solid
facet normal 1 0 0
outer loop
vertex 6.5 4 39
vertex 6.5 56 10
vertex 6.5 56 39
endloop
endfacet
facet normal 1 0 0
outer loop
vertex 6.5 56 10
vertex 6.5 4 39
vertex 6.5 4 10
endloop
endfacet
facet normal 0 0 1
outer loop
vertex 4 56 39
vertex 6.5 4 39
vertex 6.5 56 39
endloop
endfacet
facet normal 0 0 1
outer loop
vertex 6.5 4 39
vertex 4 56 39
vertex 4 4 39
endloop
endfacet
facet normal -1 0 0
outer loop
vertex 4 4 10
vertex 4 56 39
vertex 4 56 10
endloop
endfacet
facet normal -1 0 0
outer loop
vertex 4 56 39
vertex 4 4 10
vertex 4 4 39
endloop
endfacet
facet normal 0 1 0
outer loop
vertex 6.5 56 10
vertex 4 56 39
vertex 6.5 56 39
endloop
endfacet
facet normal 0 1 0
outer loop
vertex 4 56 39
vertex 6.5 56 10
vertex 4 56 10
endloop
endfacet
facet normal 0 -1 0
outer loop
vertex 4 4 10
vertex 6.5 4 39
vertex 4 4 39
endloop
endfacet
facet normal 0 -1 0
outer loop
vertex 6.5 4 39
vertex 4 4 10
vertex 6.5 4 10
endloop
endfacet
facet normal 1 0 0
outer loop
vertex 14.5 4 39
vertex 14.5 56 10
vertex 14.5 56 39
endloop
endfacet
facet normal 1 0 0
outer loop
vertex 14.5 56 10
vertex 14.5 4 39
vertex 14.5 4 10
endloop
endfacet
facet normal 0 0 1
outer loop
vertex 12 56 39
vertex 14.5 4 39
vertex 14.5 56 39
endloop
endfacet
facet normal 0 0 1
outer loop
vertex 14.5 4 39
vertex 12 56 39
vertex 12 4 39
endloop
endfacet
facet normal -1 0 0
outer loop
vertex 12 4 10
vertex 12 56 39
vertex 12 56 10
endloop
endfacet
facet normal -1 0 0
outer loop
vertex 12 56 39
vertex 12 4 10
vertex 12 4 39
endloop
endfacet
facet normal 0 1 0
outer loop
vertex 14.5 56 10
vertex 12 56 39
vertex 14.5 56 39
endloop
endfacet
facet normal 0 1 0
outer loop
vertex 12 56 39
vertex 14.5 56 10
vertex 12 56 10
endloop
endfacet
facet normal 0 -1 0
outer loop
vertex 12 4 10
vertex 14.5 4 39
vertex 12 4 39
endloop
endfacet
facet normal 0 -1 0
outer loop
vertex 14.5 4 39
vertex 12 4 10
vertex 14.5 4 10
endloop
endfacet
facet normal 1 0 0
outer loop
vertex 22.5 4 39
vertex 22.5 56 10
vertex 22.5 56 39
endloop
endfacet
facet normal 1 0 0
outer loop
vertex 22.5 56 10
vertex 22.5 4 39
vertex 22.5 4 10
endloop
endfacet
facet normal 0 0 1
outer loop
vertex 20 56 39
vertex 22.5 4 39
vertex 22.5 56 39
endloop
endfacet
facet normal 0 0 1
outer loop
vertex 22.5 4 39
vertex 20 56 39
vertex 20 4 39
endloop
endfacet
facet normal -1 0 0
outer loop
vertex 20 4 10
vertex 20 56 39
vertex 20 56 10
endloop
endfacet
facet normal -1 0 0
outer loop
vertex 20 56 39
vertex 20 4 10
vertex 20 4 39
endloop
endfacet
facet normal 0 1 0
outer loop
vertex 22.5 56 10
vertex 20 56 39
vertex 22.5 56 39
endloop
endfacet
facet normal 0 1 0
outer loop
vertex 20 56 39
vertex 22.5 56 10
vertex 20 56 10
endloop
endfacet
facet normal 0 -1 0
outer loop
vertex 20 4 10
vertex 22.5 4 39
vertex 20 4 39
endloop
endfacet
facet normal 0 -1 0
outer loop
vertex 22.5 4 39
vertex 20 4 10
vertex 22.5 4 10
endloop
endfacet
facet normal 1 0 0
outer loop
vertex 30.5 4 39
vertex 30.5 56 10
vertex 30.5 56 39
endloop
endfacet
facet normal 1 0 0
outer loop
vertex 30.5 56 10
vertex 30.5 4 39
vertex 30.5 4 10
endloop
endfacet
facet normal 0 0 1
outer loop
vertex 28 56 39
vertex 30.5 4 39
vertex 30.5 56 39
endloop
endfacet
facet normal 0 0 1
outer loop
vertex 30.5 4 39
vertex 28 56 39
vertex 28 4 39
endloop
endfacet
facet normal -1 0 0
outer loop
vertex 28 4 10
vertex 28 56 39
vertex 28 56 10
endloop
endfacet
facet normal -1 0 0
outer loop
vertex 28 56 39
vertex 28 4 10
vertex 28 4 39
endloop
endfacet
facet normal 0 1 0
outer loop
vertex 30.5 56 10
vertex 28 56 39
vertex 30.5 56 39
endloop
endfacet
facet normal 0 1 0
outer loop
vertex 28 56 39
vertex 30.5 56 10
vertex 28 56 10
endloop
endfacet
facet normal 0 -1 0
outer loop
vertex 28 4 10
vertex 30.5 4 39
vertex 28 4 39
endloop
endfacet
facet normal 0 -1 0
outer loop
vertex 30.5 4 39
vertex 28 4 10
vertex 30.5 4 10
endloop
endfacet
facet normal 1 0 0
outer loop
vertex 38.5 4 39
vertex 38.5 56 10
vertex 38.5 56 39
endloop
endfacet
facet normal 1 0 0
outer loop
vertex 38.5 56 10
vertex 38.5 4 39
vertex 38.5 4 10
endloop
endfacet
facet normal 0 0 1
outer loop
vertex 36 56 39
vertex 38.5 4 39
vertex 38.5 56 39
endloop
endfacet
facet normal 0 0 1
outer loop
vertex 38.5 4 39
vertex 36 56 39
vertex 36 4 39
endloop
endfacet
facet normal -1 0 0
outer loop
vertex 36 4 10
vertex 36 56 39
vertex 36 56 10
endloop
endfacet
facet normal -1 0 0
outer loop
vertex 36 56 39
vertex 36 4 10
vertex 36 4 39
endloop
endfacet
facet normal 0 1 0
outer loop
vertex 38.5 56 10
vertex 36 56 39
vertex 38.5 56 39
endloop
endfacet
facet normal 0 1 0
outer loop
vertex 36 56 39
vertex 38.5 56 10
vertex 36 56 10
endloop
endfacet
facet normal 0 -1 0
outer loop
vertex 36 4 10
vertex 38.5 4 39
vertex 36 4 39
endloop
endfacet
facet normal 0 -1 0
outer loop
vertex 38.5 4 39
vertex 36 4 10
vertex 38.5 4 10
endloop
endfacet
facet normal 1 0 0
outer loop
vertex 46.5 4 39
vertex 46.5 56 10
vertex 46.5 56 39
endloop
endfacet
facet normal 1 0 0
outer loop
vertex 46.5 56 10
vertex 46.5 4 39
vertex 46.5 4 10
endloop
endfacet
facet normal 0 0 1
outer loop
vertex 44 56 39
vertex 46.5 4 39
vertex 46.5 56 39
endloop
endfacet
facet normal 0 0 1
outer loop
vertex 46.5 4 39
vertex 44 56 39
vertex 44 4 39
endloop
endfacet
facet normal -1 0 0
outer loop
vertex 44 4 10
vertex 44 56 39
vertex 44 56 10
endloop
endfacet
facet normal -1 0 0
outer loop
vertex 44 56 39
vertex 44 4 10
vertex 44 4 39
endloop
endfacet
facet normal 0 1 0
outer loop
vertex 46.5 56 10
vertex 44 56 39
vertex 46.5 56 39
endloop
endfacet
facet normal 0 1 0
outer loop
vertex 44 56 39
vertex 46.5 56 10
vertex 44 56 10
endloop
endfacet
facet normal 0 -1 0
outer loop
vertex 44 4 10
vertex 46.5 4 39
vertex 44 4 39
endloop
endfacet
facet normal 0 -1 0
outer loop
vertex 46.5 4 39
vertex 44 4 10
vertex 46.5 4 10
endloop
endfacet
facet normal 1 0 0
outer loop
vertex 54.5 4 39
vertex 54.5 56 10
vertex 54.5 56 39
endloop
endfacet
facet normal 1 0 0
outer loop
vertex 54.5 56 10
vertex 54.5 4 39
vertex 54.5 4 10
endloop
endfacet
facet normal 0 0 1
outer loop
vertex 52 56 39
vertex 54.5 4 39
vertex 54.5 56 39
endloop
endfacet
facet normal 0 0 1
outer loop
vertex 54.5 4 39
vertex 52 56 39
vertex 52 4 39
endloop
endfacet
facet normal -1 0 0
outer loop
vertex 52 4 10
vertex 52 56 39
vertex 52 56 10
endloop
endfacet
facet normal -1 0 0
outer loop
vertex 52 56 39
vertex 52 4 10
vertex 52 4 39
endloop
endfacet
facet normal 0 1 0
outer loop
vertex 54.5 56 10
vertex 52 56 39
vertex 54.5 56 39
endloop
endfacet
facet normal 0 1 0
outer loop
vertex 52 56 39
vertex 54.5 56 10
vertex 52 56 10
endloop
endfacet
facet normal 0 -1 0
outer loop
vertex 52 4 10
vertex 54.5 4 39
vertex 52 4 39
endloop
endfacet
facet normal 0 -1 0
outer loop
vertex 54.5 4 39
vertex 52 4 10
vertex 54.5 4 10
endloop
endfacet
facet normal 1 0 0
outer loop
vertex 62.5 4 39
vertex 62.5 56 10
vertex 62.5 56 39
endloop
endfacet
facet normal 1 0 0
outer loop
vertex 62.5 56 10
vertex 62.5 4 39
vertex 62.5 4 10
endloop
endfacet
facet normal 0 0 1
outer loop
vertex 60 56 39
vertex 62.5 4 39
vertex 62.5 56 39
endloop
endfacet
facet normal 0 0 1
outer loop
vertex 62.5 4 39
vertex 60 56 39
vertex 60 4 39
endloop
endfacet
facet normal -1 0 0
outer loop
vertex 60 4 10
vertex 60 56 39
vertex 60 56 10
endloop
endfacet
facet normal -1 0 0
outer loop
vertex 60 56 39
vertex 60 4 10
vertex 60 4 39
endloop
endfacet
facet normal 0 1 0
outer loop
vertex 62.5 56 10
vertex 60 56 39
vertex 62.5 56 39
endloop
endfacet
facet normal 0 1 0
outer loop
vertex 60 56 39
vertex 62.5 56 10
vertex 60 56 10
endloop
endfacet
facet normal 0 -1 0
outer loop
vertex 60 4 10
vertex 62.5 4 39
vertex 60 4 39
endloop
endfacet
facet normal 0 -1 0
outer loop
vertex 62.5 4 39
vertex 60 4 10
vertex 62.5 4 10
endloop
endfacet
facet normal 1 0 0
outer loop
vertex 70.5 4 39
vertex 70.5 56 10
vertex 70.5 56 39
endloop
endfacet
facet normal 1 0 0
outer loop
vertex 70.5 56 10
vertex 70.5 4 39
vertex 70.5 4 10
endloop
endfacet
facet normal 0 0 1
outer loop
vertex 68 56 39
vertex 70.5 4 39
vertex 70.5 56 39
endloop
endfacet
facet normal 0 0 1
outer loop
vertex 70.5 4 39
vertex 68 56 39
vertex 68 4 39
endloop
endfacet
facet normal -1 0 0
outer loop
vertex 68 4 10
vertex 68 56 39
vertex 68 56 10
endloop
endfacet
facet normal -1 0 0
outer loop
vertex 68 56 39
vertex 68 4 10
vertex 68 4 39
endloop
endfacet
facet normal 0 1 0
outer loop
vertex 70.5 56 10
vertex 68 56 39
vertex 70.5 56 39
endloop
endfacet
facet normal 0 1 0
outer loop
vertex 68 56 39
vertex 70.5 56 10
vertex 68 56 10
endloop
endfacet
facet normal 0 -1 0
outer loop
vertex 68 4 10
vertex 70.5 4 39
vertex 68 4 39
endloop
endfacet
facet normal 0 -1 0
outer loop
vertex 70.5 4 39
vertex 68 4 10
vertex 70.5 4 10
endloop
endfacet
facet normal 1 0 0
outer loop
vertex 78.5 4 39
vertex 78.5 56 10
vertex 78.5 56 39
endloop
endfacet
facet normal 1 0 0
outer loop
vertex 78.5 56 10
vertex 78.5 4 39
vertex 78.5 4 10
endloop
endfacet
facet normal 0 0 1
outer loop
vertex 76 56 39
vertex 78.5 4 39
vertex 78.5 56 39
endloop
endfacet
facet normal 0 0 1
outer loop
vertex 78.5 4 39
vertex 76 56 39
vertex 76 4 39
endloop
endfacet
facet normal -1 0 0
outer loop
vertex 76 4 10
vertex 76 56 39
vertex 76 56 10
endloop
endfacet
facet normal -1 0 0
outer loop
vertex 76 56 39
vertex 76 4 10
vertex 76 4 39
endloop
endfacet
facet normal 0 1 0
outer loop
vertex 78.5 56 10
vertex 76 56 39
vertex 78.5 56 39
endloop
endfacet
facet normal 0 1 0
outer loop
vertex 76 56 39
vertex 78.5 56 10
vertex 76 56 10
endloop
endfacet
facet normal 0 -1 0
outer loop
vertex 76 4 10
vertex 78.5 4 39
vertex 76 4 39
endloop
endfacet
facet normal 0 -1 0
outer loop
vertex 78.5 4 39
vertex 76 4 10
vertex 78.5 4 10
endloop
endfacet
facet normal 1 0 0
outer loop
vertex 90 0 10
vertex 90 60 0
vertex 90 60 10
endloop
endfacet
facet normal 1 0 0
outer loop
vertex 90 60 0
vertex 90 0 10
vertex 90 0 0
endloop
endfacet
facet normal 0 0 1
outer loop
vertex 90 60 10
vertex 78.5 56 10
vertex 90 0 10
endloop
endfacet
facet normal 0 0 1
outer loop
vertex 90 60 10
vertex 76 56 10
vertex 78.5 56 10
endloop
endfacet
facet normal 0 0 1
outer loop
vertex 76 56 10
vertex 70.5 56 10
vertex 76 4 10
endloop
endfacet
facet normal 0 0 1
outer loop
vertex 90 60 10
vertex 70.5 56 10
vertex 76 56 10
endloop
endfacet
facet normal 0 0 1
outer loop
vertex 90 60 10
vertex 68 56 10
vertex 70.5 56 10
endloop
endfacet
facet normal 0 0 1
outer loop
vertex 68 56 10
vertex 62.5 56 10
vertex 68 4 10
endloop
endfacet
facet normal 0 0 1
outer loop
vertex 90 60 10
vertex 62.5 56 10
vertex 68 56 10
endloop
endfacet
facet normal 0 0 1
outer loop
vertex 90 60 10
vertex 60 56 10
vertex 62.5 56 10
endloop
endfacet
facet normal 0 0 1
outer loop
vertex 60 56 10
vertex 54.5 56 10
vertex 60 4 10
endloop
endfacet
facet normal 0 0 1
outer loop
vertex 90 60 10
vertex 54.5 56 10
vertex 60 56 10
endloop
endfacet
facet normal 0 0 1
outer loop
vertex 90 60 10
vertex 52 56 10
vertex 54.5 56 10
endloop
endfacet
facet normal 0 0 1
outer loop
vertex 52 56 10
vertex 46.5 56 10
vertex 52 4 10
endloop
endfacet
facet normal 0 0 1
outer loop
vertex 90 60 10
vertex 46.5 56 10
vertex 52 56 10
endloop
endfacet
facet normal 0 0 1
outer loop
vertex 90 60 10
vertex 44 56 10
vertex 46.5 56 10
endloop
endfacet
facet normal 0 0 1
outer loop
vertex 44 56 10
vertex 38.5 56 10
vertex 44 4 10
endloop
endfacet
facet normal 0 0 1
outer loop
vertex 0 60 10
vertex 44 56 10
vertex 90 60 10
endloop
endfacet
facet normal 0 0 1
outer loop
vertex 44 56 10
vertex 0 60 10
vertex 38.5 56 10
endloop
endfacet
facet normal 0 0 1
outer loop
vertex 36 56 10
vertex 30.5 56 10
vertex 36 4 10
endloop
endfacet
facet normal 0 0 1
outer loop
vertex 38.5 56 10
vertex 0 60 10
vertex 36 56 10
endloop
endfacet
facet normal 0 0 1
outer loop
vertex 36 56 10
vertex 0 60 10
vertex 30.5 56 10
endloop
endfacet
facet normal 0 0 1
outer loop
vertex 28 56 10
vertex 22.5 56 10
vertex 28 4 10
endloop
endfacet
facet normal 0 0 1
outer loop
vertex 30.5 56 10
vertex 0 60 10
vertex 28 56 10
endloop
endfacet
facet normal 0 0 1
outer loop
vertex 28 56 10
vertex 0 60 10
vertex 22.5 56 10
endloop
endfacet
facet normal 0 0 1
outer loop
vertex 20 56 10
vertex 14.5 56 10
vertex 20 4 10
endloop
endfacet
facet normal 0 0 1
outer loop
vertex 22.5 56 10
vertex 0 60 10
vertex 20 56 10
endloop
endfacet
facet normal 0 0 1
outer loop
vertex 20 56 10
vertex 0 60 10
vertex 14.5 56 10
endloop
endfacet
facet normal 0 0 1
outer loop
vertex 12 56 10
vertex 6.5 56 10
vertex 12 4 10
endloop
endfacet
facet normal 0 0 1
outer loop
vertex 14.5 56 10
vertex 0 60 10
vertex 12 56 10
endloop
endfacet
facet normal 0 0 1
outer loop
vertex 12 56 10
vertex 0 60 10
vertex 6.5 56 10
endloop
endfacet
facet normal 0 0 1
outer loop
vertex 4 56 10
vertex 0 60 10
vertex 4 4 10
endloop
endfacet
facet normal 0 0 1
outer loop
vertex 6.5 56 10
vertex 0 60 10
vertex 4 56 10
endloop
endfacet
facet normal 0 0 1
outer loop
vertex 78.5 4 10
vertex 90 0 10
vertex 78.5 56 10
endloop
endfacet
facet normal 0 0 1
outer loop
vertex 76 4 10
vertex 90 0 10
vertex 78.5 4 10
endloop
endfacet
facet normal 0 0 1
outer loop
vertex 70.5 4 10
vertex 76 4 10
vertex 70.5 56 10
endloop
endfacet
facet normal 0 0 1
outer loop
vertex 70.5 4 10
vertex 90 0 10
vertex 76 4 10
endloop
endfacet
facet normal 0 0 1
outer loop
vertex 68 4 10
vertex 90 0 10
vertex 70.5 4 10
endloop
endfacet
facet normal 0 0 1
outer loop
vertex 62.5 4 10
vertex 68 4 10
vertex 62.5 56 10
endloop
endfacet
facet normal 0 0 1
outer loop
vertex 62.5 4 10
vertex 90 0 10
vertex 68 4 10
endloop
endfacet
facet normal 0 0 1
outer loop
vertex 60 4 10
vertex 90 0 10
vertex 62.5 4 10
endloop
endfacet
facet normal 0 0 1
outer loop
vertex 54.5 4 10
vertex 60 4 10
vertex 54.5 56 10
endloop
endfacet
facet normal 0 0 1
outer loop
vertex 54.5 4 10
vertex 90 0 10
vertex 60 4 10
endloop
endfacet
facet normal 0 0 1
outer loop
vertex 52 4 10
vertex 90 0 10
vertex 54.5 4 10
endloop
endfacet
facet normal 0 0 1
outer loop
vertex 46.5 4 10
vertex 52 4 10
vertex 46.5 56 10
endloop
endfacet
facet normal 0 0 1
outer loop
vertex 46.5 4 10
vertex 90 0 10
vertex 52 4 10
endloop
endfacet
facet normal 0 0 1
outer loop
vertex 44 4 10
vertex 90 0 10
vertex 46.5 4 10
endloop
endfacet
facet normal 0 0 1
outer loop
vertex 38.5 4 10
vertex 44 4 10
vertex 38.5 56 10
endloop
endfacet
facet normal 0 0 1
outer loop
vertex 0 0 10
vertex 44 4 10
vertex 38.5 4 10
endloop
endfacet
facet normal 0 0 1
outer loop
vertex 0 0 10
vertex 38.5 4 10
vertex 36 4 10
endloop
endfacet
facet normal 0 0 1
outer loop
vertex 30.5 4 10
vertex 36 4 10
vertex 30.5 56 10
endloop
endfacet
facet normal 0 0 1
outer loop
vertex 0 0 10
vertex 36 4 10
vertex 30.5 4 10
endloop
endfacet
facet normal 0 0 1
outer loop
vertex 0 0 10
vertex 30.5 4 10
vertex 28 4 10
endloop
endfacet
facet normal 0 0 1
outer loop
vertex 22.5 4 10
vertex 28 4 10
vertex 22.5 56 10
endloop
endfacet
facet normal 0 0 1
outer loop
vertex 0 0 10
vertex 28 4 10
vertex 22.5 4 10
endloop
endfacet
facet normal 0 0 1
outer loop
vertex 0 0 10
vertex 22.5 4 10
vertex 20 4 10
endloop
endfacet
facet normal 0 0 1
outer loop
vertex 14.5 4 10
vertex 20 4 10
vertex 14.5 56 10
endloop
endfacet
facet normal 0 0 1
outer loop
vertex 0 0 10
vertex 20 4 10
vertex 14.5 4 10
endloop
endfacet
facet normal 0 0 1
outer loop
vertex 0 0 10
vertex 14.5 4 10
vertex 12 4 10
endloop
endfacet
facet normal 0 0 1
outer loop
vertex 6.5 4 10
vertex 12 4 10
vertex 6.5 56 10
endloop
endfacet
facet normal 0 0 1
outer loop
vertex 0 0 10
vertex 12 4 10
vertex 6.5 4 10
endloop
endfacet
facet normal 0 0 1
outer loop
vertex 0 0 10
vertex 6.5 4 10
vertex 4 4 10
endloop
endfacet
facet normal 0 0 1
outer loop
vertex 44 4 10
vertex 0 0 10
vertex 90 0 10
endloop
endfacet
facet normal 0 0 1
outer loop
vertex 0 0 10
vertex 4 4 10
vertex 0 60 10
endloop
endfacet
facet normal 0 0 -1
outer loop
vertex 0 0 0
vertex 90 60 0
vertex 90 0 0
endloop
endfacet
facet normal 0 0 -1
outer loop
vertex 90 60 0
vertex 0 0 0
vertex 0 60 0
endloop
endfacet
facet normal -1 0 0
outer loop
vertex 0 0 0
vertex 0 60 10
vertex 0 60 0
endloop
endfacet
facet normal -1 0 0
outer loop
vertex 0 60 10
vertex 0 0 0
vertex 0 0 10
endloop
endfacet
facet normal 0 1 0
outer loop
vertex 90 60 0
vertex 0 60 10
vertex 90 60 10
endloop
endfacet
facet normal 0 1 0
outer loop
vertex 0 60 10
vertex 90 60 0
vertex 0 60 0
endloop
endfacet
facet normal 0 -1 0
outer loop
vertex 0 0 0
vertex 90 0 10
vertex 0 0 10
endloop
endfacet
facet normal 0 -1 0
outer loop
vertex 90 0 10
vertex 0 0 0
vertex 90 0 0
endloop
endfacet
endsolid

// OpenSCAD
$fn = 32;

// ----------------------------------------------------------------------
// Heatsink: uniform fin block
// ----------------------------------------------------------------------

// --- parameters (mm) ---
base_l = 90;              // base length, X
base_w = 60;              // base width, Y
base_t = 10;              // base plate thickness
fin_h = 30;               // fin height above the base
fin_t = 2.5;              // fin thickness
edge = 4;                 // margin from the base ends
pitch = 8;                // fin pitch

n_fins = floor((base_l - 2 * edge - fin_t) / pitch) + 1;  // fin count
total_h = base_t + fin_h - 1;  // overall height

union() {
  cube([base_l, base_w, base_t]);
  for (i = [0 : n_fins - 1])
    translate([edge + i * pitch, edge, base_t - 1])
      cube([fin_t, base_w - 2 * edge, fin_h]);
}
